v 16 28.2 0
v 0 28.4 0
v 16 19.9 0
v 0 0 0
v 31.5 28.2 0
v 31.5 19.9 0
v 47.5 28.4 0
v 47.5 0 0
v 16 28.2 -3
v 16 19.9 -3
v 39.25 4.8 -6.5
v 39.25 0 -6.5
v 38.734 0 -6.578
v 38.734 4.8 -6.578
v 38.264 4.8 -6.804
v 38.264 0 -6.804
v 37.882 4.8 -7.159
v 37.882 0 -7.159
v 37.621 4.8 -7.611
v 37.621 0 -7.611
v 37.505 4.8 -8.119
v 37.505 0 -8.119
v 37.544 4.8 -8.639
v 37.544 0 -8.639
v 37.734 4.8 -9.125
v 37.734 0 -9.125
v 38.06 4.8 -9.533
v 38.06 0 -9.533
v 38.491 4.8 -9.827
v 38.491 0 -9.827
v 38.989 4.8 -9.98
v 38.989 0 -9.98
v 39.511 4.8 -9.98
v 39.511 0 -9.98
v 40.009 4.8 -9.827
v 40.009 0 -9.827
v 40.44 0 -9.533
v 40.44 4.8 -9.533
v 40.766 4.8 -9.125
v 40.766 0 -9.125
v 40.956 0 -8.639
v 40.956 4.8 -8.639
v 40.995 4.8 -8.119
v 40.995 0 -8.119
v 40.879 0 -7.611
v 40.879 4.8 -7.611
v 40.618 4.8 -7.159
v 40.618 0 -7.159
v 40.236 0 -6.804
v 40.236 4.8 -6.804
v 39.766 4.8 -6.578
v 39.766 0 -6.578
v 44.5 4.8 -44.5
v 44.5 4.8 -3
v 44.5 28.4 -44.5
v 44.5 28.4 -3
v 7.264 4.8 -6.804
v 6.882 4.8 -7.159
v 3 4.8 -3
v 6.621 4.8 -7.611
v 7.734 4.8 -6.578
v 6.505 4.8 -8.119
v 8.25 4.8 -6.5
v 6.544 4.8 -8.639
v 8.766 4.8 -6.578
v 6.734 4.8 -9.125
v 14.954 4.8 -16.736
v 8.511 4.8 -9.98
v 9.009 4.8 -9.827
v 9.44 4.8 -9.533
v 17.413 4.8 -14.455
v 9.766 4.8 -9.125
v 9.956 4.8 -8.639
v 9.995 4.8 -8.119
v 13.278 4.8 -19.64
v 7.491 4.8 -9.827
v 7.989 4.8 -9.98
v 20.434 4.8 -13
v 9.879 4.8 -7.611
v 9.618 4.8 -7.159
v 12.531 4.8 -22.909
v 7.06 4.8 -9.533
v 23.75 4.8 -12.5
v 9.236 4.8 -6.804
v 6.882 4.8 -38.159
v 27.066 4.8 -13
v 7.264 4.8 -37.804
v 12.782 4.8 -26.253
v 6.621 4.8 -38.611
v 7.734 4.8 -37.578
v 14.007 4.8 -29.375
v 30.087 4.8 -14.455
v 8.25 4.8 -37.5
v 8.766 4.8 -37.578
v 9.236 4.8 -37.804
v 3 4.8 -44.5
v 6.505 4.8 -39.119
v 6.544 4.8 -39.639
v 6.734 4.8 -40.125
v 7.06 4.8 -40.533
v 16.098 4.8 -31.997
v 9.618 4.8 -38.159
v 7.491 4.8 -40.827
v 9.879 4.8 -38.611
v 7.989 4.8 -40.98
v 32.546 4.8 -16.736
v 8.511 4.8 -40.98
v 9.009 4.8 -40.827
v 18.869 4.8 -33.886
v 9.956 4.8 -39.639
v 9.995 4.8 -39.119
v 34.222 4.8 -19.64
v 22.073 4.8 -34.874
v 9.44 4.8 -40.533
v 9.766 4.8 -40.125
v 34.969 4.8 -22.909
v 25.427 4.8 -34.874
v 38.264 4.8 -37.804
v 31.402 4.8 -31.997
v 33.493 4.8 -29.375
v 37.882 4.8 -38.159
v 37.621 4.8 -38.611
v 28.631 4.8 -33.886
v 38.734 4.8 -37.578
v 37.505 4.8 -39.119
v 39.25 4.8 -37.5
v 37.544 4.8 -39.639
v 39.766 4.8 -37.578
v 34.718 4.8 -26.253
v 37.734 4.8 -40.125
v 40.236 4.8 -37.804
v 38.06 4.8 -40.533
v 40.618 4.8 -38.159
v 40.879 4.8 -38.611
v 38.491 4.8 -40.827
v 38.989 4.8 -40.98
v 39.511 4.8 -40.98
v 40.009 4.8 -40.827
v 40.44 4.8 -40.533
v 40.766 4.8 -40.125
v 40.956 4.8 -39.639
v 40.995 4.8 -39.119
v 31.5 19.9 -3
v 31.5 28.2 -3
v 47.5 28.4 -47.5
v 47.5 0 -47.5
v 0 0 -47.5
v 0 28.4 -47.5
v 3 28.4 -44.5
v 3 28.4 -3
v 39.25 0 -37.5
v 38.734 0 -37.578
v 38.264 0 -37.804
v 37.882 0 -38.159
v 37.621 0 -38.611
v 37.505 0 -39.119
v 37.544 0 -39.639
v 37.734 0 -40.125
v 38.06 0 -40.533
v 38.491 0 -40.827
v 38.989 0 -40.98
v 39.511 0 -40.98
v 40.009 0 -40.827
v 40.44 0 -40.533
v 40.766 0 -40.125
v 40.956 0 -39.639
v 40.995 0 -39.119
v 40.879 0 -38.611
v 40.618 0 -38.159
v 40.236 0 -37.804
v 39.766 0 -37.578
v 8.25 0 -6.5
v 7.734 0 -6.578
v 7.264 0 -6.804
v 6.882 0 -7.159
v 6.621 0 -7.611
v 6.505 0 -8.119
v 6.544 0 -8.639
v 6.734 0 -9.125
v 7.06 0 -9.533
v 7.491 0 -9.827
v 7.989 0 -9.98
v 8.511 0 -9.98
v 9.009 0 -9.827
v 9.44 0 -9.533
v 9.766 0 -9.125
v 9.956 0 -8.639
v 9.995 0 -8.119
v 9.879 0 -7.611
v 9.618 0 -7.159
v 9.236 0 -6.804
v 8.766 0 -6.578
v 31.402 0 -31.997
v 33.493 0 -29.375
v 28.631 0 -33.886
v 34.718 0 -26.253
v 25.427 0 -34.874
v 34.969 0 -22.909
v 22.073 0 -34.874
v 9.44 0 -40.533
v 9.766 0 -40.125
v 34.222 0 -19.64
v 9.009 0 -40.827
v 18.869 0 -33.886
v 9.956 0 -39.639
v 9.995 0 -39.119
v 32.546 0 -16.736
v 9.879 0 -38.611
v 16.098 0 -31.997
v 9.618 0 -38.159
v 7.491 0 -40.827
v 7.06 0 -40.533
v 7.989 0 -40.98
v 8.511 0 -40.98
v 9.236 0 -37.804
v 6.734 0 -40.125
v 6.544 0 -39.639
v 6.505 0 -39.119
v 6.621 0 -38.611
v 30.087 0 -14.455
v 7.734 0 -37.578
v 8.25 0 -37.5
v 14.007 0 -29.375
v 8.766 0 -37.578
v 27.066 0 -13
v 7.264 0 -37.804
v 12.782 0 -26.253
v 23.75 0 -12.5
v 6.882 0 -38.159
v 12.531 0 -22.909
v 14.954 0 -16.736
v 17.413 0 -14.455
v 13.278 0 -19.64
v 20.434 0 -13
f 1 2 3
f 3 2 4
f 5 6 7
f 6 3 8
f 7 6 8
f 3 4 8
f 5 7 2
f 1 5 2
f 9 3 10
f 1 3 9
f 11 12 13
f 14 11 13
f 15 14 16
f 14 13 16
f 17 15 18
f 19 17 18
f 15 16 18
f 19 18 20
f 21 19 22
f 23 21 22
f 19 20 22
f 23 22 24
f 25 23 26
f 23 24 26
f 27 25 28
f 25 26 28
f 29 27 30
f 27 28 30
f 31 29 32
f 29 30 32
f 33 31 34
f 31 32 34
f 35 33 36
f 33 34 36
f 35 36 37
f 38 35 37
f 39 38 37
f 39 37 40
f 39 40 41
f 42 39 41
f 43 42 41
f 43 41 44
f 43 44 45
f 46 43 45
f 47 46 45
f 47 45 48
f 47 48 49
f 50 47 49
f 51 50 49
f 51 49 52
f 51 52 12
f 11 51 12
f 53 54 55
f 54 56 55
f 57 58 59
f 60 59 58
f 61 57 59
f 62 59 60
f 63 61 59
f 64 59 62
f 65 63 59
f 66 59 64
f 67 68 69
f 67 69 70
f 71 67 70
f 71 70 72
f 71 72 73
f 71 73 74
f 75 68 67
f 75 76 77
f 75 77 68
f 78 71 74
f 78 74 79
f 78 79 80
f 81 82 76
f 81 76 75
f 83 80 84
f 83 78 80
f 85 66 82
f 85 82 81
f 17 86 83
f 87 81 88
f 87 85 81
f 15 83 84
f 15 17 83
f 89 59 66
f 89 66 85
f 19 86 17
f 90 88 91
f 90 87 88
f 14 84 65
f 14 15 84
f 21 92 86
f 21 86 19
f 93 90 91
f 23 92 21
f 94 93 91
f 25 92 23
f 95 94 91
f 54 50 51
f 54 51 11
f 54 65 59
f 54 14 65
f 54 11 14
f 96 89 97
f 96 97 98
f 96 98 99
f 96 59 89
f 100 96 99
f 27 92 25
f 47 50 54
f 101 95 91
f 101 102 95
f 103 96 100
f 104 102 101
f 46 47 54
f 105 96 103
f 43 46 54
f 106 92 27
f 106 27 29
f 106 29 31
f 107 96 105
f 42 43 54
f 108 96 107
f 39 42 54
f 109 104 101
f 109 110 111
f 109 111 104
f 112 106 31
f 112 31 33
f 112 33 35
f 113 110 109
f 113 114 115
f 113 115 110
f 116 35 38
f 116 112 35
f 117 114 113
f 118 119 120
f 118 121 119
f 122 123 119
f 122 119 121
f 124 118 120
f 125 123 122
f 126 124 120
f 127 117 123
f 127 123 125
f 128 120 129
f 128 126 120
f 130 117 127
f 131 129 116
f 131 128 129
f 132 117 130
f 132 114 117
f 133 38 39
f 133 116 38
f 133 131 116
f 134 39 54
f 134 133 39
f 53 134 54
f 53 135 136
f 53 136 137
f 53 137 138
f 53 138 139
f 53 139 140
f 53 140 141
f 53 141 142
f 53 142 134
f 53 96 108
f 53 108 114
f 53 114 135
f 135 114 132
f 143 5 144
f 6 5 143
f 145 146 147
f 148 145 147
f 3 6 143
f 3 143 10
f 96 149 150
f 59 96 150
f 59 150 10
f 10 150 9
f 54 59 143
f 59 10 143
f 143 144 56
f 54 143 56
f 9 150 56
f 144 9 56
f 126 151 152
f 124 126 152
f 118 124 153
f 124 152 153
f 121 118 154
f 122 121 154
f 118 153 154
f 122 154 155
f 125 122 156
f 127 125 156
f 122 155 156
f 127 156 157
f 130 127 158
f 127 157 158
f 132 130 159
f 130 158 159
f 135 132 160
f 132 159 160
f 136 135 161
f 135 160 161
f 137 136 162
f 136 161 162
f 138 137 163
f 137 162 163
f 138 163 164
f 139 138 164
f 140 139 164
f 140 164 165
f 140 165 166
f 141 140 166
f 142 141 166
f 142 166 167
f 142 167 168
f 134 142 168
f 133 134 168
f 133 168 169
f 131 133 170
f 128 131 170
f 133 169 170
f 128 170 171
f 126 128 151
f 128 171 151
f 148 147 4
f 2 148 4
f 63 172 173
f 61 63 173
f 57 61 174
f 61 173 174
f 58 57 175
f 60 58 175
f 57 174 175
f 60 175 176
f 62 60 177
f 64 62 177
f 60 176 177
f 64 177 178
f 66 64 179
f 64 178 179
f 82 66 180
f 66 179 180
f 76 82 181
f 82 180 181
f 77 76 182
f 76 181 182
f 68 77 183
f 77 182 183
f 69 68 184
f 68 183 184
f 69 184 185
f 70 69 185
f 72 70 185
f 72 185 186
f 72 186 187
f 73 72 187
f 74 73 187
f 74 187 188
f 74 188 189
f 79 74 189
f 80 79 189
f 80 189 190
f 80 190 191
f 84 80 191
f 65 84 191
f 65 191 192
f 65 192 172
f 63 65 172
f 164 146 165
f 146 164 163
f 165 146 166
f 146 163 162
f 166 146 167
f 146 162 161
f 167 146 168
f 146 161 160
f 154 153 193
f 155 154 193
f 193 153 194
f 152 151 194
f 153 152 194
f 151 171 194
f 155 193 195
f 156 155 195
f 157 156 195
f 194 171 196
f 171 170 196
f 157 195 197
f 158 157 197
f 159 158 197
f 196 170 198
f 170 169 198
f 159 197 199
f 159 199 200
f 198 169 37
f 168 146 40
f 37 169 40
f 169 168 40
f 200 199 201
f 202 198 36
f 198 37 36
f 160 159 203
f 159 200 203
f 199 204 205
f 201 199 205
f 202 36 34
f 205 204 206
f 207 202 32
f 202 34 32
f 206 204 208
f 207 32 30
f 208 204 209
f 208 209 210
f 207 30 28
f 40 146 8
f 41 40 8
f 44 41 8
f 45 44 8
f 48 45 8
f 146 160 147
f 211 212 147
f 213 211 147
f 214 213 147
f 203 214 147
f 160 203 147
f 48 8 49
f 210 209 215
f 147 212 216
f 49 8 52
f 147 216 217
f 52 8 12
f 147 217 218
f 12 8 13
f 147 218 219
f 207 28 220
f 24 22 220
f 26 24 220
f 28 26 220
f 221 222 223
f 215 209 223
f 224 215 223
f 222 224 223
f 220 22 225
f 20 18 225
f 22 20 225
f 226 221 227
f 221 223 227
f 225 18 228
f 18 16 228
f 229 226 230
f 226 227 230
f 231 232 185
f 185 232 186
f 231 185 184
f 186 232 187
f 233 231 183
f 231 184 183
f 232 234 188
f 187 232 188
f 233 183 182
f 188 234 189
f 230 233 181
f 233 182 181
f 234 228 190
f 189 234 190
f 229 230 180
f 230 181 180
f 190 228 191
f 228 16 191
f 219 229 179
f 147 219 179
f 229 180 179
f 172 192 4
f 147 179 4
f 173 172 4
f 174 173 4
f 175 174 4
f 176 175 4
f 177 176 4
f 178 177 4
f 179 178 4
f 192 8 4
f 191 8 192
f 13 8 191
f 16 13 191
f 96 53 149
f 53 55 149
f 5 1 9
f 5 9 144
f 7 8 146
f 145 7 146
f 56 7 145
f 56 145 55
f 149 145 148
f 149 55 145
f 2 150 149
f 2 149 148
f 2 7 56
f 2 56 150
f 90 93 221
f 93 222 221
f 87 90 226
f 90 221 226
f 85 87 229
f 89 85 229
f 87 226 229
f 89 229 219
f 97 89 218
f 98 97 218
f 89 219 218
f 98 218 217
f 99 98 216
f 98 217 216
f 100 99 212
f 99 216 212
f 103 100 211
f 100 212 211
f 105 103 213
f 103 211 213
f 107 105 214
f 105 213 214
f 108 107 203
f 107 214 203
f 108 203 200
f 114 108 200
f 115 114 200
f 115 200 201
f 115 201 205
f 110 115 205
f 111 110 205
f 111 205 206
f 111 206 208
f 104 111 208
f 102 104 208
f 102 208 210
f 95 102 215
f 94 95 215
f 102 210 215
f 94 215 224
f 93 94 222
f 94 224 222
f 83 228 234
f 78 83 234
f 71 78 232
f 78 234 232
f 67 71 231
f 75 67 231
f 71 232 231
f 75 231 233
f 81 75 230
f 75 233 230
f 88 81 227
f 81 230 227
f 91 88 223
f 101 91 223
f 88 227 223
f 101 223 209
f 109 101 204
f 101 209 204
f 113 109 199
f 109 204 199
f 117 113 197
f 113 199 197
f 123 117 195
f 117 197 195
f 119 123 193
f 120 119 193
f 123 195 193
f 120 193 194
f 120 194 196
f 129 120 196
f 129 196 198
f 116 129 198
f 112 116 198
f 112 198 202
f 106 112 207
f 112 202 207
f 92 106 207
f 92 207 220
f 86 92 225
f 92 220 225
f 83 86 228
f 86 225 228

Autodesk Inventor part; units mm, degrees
ref_plane "YZ Plane" through (0, 0, 0) normal (1, 0, 0) x (0, 1, 0)
ref_plane "XZ Plane" through (0, 0, 0) normal (0, 1, 0) x (-1, 0, 0)
ref_plane "XY Plane" through (0, 0, 0) normal (0, 0, 1) x (1, 0, 0)
sketch "スケッチ1" plane through (0, 0, 0) normal (0, 1, 0) x (-1, 0, 0)
  line L0 (0, 0) -> (-47.5, 0)
  line L1 (-47.5, 0) -> (-47.5, -47.5)
  line L2 (-47.5, -47.5) -> (0, -47.5)
  line L3 (0, -47.5) -> (0, 0)
  dimension "d0" = 47.5
  dimension "d1" = 47.5
extrude "押し出し1" add sketch "スケッチ1" along normal blind 28.4
ref_plane "作業平面1" through (0, 28.4, 0) normal (0, 1, 0) x (1, 0, 0)
sketch "スケッチ3" plane through (0, 28.4, 0) normal (0, 1, 0) x (1, 0, 0)
  line L0 (3, 3) -> (44.5, 3)
  line L1 (44.5, 3) -> (44.5, 44.5)
  line L2 (44.5, 44.5) -> (3, 44.5)
  line L3 (3, 44.5) -> (3, 3)
  line L4 (47.5, 47.5) -> (0, 47.5) projected
  line L5 (0, 47.5) -> (0, 0) projected
  dimension "d15" = 41.5
  dimension "d16" = 41.5
  dimension "d17" = 3
  dimension "d18" = 3
extrude "押し出し3" cut sketch "スケッチ3" against normal blind 23.6
ref_plane "作業平面2" through (0, 4.8, 0) normal (0, 1, 0) x (1, 0, 0)
sketch "スケッチ4" plane through (0, 4.8, 0) normal (0, 1, 0) x (1, 0, 0)
  point P0 (0, 0)
  point P1 (23.75, 23.75)
hole "穴1" at (23.75, 4.8, -23.75) direction (0, -1, 0) diameter 22.5 end through all
sketch "スケッチ5" plane through (0, 4.8, 0) normal (0, 1, 0) x (1, 0, 0)
  line L0 (3, 44.5) -> (44.5, 44.5) projected
  line L1 (3, 3) -> (3, 44.5) projected
  line L2 (44.5, 44.5) -> (44.5, 3) projected
  line L3 (44.5, 3) -> (3, 3) projected
  point P0 (0, 0)
  point P1 (8.25, 39.25)
  point P2 (39.25, 39.25)
  point P3 (39.25, 8.25)
  point P4 (8.25, 8.25)
  dimension "d29" = 5.25
  dimension "d30" = 5.25
  dimension "d31" = 5.25
  dimension "d32" = 5.25
  dimension "d33" = 5.25
  dimension "d34" = 5.25
  dimension "d35" = 5.25
  dimension "d36" = 5.25
hole "穴2" at (8.25, 4.8, -39.25) at (39.25, 4.8, -39.25) at (39.25, 4.8, -8.25) at (8.25, 4.8, -8.25) direction (0, -1, 0) diameter 3.5 end through all
ref_plane "作業平面3" through (0, 0, 0) normal (0, 0, 1) x (1, 0, 0)
sketch "スケッチ6" plane through (0, 0, 0) normal (0, 0, 1) x (1, 0, 0)
  line L0 (16, 28.2) -> (31.5, 28.2)
  line L1 (31.5, 28.2) -> (31.5, 19.9)
  line L2 (31.5, 19.9) -> (16, 19.9)
  line L3 (16, 19.9) -> (16, 28.2)
  line L4 (0, 0) -> (47.5, 0) projected
  line L5 (0, 28.4) -> (47.5, 28.4) projected
  point P0 (23.75, 19.9)
  point P1 (23.75, 0)
  point P2 (23.75, 0)
  dimension "d46" = 19.9
  dimension "d47" = 0
  dimension "d48" = 15.5
  dimension "d51" = 8.5
extrude "押し出し4" cut sketch "スケッチ6" against normal blind 23.6
properties part number "motor_case"
